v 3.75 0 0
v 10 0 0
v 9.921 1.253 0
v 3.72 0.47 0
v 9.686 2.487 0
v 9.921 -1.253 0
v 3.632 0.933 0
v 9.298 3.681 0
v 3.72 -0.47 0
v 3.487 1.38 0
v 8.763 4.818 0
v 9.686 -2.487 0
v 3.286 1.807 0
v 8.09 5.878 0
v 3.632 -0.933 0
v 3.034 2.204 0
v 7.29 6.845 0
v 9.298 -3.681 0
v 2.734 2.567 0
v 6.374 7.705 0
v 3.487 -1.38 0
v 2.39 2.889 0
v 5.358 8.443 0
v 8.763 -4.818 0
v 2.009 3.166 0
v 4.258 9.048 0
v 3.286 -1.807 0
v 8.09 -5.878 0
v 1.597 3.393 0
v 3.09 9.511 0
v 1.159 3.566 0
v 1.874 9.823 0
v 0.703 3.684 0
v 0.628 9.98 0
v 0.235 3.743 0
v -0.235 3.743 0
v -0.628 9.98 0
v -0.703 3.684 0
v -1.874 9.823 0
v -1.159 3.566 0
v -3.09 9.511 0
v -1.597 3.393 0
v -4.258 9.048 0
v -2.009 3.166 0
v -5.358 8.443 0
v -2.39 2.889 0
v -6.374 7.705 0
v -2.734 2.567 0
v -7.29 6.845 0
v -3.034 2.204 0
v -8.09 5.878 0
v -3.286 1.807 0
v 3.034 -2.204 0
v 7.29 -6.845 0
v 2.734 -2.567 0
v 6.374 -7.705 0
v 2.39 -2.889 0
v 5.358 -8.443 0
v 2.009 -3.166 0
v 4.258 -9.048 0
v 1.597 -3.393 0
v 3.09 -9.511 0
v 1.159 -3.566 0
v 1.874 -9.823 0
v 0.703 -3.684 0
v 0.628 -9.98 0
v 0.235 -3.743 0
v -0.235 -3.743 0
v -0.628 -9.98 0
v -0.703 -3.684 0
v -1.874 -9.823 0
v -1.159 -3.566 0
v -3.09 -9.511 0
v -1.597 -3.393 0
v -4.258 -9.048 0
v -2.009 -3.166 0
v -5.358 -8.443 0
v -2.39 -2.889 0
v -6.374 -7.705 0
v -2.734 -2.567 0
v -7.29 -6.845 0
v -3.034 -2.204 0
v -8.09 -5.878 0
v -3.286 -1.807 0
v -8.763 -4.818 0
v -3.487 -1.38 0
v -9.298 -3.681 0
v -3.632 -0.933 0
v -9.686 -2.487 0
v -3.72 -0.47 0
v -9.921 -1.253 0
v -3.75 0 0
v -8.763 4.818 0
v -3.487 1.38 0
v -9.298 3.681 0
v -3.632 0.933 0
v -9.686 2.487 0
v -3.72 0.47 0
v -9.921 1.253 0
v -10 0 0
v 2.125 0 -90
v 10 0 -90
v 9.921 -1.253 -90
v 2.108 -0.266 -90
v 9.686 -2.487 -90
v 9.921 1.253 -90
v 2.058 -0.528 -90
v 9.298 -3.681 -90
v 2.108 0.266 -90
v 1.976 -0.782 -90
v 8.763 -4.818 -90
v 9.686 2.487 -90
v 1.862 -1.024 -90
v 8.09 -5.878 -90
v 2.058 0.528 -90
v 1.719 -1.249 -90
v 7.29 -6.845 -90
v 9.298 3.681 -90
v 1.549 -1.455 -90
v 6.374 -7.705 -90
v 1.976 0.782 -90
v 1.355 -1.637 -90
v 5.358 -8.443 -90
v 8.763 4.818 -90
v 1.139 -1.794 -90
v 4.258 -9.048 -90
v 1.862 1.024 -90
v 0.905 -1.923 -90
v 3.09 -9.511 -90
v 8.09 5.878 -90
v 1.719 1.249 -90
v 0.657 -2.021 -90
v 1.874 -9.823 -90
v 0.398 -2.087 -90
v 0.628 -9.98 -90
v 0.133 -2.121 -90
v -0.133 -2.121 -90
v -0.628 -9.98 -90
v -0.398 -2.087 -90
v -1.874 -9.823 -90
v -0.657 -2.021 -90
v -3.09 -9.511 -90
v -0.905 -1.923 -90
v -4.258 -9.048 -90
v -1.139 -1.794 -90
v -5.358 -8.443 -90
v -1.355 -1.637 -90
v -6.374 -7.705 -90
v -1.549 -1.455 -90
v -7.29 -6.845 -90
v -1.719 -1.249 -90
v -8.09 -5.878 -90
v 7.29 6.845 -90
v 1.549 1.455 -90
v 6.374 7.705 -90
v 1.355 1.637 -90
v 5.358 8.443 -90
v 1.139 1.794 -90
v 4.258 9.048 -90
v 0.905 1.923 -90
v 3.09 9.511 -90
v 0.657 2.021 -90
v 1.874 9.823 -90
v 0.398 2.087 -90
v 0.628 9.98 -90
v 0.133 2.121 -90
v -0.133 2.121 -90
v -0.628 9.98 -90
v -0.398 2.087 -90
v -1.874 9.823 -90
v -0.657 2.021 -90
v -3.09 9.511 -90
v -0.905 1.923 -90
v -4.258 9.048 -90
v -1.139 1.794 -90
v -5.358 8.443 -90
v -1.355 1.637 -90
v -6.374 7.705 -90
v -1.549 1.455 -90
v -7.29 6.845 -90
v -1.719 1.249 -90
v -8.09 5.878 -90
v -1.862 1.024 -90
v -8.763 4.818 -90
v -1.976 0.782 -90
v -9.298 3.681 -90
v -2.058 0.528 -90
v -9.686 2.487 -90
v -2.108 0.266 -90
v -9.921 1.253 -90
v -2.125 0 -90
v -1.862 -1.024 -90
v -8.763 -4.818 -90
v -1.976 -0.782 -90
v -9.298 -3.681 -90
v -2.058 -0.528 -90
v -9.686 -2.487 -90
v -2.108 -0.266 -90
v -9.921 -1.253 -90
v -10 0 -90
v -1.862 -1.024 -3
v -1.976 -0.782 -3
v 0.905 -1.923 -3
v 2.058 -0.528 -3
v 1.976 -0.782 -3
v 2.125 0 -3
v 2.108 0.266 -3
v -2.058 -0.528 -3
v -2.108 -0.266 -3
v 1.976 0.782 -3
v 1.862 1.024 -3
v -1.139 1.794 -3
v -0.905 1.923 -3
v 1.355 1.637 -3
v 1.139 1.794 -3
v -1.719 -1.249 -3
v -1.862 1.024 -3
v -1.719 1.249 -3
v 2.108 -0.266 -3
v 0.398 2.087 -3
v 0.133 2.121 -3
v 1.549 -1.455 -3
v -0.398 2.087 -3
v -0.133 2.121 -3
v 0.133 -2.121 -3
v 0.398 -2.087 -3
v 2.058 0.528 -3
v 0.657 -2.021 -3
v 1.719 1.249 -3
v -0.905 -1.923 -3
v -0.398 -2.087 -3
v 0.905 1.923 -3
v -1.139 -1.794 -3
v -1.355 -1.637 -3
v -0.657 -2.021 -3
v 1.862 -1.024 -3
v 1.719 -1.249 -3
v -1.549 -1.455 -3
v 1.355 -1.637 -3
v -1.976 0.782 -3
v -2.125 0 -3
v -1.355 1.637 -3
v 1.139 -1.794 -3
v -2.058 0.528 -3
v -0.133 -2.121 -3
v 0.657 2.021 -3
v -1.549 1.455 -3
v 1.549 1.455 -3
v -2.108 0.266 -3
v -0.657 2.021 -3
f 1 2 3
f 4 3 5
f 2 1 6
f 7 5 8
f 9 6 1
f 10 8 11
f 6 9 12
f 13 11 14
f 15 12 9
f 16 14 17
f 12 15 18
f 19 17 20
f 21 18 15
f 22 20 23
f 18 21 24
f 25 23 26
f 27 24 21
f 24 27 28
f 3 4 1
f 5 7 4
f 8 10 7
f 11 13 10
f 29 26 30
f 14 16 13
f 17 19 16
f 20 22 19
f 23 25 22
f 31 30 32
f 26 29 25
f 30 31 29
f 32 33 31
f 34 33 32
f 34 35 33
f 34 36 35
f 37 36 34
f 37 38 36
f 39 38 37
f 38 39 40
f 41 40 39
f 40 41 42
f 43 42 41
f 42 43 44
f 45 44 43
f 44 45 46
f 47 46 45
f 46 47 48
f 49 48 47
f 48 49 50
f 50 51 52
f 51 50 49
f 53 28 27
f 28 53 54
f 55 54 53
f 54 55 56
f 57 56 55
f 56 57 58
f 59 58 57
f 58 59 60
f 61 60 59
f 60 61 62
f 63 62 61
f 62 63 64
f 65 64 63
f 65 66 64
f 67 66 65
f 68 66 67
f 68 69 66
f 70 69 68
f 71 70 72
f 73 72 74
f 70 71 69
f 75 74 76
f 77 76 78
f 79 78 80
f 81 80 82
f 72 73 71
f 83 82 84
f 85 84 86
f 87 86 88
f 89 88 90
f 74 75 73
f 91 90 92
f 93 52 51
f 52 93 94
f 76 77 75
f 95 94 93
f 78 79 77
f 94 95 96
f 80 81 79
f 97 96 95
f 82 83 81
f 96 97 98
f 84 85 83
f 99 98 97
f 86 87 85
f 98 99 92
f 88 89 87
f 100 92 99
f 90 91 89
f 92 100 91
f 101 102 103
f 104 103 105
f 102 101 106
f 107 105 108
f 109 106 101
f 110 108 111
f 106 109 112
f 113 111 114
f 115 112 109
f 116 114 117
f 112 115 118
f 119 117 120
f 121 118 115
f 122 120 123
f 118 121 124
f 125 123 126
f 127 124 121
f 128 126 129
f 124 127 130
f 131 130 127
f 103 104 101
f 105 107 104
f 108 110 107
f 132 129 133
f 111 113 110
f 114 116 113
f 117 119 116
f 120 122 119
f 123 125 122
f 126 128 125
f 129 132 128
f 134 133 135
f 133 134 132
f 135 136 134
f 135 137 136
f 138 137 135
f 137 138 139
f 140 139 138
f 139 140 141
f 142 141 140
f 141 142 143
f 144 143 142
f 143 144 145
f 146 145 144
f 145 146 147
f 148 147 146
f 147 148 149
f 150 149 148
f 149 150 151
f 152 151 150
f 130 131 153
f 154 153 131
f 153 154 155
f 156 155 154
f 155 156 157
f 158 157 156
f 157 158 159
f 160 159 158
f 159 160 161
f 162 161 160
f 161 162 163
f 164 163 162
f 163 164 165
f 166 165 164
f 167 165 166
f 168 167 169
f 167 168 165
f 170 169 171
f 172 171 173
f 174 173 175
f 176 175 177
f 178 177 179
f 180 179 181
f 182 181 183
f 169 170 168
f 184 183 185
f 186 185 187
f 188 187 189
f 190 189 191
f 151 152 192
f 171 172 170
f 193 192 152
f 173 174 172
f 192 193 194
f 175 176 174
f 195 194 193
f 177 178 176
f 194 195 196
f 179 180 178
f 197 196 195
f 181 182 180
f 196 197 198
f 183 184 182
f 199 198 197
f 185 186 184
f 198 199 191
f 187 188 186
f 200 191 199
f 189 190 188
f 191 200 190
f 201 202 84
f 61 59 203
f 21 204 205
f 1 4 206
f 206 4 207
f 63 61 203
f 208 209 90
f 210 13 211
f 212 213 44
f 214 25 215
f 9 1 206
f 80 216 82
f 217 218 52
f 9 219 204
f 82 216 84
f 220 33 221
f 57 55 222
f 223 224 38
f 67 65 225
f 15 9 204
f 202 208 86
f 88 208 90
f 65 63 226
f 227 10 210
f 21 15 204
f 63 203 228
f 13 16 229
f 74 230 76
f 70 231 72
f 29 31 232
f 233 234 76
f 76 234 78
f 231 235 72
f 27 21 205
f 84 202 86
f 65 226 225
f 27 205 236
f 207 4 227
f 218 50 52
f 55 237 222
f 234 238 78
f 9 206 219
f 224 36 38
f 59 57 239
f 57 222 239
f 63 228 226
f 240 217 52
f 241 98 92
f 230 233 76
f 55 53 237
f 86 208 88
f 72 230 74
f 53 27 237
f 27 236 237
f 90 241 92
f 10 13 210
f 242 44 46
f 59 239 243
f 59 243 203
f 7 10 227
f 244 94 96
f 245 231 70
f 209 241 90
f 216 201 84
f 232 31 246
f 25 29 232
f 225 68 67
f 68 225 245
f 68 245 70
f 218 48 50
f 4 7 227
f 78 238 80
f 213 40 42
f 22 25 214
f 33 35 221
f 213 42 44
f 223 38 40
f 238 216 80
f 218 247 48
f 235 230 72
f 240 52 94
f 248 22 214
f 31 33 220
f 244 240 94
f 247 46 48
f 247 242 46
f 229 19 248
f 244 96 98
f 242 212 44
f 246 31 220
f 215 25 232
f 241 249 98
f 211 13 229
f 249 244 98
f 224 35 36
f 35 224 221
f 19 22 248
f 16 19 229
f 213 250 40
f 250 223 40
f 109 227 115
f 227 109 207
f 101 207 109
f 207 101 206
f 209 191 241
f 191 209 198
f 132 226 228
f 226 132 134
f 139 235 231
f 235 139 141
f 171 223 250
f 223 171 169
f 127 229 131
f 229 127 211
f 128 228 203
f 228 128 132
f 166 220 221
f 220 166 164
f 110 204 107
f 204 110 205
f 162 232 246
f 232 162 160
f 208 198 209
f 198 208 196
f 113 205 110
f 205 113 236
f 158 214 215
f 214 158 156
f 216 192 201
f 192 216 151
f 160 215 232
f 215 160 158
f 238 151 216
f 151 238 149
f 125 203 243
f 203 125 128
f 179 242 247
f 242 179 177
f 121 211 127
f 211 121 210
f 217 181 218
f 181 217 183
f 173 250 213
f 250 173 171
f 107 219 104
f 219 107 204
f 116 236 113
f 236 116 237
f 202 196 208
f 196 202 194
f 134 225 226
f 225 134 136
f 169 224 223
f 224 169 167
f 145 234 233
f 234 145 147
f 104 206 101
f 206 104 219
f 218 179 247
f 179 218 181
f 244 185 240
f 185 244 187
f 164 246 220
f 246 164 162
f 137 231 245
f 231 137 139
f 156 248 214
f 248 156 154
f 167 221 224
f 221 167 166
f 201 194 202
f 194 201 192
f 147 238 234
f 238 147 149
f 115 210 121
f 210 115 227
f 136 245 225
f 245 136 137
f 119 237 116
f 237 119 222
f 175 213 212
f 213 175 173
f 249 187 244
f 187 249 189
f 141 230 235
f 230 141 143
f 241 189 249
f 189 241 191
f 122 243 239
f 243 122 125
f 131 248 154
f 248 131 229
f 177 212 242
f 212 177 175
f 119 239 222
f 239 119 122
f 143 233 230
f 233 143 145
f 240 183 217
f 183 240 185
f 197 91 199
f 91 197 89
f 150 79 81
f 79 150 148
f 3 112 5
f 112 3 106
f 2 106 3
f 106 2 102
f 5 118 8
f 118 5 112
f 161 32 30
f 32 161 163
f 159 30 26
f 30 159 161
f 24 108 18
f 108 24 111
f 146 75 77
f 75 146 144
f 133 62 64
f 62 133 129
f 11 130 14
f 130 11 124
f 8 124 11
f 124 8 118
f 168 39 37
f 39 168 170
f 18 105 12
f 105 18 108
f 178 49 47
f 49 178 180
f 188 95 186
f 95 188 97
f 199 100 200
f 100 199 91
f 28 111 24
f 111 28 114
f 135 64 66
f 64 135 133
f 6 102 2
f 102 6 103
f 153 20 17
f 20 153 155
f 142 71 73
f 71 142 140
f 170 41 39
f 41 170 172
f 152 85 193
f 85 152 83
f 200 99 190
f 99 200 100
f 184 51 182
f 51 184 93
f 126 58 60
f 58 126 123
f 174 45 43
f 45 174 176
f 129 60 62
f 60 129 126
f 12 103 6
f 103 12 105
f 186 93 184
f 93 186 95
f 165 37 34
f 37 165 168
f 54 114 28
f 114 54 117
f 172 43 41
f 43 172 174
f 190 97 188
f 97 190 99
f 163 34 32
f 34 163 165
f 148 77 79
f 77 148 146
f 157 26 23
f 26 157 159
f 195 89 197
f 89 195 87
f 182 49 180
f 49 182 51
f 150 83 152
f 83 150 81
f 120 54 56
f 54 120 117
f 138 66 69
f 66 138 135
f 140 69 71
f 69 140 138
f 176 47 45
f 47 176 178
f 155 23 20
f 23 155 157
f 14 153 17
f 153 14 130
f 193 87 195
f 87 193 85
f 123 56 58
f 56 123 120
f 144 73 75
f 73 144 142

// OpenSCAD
$fn = 50;


difference() {
	union() {
		translate(v = [0, 0, -90.0000000000]) {
			cylinder(h = 90, r = 10.0000000000);
		}
		cylinder(h = 0, r = 16.0000000000);
	}
	union() {
		translate(v = [0, 0, 0]) {
			rotate(a = [0, 0, 0]) {
				difference() {
					union() {
						#translate(v = [0, 0, -90.0000000000]) {
							cylinder(h = 90, r = 2.0000000000);
						}
						#translate(v = [0, 0, -3]) {
							cylinder(h = 3, r = 10.0000000000, r1 = 2.1250000000, r2 = 3.7500000000);
						}
						#translate(v = [0, 0, -90.0000000000]) {
							cylinder(h = 90, r = 2.1250000000);
						}
						#translate(v = [0, 0, -90.0000000000]) {
							cylinder(h = 90, r = 2.0000000000);
						}
					}
					union();
				}
			}
		}
	}
}
